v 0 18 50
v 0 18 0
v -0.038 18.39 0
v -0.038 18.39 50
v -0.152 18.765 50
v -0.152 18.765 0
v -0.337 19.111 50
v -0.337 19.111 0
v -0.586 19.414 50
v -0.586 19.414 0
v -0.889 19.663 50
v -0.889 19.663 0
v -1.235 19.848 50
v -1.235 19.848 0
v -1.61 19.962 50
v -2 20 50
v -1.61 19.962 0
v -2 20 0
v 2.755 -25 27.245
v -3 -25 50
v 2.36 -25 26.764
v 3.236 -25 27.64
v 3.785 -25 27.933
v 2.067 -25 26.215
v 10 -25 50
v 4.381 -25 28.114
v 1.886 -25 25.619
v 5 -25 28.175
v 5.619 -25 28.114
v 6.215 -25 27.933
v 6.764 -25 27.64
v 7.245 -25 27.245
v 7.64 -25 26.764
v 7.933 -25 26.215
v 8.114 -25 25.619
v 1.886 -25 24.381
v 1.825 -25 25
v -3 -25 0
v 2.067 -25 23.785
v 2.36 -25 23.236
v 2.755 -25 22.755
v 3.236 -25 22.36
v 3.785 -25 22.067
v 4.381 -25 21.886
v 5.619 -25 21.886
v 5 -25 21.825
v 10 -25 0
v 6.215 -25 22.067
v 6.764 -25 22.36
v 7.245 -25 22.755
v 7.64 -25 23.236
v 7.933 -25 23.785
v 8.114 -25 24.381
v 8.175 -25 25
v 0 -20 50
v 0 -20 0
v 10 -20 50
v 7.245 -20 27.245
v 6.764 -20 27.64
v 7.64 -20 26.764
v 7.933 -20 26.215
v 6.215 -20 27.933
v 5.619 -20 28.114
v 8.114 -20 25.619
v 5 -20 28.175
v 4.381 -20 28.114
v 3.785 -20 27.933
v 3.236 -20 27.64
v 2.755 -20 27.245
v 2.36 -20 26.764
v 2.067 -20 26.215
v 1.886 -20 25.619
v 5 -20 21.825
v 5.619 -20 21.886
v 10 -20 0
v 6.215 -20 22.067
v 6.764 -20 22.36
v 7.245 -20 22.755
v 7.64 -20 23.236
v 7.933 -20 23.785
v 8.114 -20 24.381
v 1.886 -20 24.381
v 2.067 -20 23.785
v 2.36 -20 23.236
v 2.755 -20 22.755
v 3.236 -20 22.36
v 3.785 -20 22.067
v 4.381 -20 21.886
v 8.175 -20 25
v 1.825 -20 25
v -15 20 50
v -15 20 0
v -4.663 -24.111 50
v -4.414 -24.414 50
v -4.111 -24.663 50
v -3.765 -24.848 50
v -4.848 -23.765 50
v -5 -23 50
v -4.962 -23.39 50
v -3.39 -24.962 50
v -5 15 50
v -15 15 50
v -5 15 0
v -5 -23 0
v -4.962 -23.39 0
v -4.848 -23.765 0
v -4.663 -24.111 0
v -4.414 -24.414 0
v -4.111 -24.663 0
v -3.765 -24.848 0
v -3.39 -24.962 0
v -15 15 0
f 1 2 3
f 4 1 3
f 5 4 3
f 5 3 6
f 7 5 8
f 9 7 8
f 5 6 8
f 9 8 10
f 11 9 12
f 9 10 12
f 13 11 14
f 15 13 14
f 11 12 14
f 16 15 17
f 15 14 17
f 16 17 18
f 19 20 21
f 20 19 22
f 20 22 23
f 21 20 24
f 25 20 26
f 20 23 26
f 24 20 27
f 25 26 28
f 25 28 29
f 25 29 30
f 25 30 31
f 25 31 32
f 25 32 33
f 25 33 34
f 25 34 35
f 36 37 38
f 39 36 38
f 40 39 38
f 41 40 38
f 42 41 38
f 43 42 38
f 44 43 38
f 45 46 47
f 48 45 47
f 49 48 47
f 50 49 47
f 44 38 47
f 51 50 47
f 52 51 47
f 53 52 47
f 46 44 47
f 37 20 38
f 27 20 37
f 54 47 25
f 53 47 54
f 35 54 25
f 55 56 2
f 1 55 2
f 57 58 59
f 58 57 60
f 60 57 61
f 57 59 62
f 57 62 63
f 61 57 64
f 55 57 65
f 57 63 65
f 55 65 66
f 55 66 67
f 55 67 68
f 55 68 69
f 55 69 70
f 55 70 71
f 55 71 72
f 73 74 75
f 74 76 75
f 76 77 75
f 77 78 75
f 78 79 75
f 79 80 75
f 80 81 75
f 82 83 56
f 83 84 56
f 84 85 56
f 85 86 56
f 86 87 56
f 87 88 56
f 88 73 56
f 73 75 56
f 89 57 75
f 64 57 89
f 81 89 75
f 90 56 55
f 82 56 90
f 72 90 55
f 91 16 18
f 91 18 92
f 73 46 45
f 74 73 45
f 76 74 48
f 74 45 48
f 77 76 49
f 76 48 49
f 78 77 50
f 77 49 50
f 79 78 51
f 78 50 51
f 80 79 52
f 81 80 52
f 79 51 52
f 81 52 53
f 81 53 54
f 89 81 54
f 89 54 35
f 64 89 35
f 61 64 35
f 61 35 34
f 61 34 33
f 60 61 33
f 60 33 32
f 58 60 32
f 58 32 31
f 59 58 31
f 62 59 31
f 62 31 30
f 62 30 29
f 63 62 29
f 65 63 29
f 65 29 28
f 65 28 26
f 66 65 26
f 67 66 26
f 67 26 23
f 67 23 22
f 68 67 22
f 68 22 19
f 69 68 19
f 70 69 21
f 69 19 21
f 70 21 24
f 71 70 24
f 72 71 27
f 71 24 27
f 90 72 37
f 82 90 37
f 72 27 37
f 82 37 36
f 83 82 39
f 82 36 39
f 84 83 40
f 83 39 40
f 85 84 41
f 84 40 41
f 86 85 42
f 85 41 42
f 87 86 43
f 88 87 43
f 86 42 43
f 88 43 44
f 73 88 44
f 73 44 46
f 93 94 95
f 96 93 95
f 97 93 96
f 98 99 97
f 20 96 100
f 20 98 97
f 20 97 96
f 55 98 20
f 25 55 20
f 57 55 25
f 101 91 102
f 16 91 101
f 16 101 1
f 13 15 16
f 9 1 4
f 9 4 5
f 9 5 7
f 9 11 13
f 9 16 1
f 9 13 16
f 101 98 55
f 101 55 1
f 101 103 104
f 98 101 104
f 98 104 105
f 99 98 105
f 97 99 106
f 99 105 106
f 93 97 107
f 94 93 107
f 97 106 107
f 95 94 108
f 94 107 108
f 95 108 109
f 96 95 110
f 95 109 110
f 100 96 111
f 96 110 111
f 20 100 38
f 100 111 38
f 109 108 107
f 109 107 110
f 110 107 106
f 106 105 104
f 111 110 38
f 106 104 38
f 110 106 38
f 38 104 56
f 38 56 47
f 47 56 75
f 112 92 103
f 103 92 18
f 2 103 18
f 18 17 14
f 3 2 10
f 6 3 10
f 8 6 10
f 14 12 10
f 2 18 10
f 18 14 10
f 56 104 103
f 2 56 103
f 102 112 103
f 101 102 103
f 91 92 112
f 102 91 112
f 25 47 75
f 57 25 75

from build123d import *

# Parameters (mm, degrees)
SALIENTE_EXTRUIR1_DEPTH = 50
CORTAR_EXTRUIR1_REACH   = 70.92
CROQUIS2_R              = 3.175


with BuildPart() as part:
    # Croquis1 → Saliente-Extruir1 (new body)
    with BuildSketch(Plane.XY):
        with BuildLine():
            Line((0, 0), (0, 9))
            Line((0, 9), (0, 18))
            ThreePointArc((0, 18), (-0.585786438, 19.414213562), (-2, 20))
            Line((-2, 20), (-8.5, 20))
            Line((-8.5, 20), (-15, 20))
            Line((-15, 20), (-15, 15))
            Line((-15, 15), (-5, 15))
            Line((-5, 15), (-5, 0))
            Line((-5, 0), (-5, -23))
            ThreePointArc((-5, -23), (-4.414213562, -24.414213562), (-3, -25))
            Line((-3, -25), (10, -25))
            Line((10, -25), (10, -20))
            Line((10, -20), (0, -20))
            Line((0, -20), (0, 0))
        make_face()
    extrude(amount=SALIENTE_EXTRUIR1_DEPTH)

    # Croquis2 → Cortar-Extruir1 (cut, up to next)
    with BuildSketch(Plane.XZ.offset(25), mode=Mode.PRIVATE) as cortar_extruir1_sk1:
        with Locations(Location((5, 25, 0), (0, 0, 270))):
            Circle(CROQUIS2_R)
    cortar_extruir1_tool1 = extrude(cortar_extruir1_sk1.sketch, amount=-CORTAR_EXTRUIR1_REACH, mode=Mode.PRIVATE) & part.part
    add(cortar_extruir1_tool1.solids().sort_by_distance((5, -25, 25))[0], mode=Mode.SUBTRACT)


solid = part.part
